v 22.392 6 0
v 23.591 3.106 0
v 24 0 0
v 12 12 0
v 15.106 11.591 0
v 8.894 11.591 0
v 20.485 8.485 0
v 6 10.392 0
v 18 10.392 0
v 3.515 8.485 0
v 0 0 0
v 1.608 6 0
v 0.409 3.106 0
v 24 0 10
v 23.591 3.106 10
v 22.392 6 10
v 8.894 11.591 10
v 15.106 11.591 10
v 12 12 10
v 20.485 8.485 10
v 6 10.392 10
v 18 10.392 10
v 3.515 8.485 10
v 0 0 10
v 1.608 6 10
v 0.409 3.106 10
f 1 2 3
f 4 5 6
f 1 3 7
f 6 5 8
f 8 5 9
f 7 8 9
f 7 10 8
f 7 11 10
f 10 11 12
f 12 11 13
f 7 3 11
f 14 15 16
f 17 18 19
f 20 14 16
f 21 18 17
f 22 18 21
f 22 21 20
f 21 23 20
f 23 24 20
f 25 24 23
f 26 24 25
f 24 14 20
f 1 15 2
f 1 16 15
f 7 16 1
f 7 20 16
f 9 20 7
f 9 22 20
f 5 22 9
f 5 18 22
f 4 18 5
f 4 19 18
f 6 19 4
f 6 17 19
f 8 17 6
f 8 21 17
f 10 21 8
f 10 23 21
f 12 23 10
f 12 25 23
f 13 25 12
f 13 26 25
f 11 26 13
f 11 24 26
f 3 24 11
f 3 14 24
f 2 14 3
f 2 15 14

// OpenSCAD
$fn = 32;

// ----------------------------------------------------------------------
// Key bar: woodruff key, 10 mm thick
// ----------------------------------------------------------------------

// --- parameters (mm) ---
profile_height = 10;      // extrusion height
profile_points = 13;      // points of the closed outline

profile = [[24, 0], [23.591, 3.106], [22.392, 6], [20.485, 8.485], [18, 10.392], [15.106, 11.591], [12, 12], [8.894, 11.591], [6, 10.392], [3.515, 8.485], [1.608, 6], [0.409, 3.106], [0, 0]];  // single closed polygon, 13 points, counter clockwise

// --- the one profile operation ---
linear_extrude(height = profile_height) polygon(points = profile);
